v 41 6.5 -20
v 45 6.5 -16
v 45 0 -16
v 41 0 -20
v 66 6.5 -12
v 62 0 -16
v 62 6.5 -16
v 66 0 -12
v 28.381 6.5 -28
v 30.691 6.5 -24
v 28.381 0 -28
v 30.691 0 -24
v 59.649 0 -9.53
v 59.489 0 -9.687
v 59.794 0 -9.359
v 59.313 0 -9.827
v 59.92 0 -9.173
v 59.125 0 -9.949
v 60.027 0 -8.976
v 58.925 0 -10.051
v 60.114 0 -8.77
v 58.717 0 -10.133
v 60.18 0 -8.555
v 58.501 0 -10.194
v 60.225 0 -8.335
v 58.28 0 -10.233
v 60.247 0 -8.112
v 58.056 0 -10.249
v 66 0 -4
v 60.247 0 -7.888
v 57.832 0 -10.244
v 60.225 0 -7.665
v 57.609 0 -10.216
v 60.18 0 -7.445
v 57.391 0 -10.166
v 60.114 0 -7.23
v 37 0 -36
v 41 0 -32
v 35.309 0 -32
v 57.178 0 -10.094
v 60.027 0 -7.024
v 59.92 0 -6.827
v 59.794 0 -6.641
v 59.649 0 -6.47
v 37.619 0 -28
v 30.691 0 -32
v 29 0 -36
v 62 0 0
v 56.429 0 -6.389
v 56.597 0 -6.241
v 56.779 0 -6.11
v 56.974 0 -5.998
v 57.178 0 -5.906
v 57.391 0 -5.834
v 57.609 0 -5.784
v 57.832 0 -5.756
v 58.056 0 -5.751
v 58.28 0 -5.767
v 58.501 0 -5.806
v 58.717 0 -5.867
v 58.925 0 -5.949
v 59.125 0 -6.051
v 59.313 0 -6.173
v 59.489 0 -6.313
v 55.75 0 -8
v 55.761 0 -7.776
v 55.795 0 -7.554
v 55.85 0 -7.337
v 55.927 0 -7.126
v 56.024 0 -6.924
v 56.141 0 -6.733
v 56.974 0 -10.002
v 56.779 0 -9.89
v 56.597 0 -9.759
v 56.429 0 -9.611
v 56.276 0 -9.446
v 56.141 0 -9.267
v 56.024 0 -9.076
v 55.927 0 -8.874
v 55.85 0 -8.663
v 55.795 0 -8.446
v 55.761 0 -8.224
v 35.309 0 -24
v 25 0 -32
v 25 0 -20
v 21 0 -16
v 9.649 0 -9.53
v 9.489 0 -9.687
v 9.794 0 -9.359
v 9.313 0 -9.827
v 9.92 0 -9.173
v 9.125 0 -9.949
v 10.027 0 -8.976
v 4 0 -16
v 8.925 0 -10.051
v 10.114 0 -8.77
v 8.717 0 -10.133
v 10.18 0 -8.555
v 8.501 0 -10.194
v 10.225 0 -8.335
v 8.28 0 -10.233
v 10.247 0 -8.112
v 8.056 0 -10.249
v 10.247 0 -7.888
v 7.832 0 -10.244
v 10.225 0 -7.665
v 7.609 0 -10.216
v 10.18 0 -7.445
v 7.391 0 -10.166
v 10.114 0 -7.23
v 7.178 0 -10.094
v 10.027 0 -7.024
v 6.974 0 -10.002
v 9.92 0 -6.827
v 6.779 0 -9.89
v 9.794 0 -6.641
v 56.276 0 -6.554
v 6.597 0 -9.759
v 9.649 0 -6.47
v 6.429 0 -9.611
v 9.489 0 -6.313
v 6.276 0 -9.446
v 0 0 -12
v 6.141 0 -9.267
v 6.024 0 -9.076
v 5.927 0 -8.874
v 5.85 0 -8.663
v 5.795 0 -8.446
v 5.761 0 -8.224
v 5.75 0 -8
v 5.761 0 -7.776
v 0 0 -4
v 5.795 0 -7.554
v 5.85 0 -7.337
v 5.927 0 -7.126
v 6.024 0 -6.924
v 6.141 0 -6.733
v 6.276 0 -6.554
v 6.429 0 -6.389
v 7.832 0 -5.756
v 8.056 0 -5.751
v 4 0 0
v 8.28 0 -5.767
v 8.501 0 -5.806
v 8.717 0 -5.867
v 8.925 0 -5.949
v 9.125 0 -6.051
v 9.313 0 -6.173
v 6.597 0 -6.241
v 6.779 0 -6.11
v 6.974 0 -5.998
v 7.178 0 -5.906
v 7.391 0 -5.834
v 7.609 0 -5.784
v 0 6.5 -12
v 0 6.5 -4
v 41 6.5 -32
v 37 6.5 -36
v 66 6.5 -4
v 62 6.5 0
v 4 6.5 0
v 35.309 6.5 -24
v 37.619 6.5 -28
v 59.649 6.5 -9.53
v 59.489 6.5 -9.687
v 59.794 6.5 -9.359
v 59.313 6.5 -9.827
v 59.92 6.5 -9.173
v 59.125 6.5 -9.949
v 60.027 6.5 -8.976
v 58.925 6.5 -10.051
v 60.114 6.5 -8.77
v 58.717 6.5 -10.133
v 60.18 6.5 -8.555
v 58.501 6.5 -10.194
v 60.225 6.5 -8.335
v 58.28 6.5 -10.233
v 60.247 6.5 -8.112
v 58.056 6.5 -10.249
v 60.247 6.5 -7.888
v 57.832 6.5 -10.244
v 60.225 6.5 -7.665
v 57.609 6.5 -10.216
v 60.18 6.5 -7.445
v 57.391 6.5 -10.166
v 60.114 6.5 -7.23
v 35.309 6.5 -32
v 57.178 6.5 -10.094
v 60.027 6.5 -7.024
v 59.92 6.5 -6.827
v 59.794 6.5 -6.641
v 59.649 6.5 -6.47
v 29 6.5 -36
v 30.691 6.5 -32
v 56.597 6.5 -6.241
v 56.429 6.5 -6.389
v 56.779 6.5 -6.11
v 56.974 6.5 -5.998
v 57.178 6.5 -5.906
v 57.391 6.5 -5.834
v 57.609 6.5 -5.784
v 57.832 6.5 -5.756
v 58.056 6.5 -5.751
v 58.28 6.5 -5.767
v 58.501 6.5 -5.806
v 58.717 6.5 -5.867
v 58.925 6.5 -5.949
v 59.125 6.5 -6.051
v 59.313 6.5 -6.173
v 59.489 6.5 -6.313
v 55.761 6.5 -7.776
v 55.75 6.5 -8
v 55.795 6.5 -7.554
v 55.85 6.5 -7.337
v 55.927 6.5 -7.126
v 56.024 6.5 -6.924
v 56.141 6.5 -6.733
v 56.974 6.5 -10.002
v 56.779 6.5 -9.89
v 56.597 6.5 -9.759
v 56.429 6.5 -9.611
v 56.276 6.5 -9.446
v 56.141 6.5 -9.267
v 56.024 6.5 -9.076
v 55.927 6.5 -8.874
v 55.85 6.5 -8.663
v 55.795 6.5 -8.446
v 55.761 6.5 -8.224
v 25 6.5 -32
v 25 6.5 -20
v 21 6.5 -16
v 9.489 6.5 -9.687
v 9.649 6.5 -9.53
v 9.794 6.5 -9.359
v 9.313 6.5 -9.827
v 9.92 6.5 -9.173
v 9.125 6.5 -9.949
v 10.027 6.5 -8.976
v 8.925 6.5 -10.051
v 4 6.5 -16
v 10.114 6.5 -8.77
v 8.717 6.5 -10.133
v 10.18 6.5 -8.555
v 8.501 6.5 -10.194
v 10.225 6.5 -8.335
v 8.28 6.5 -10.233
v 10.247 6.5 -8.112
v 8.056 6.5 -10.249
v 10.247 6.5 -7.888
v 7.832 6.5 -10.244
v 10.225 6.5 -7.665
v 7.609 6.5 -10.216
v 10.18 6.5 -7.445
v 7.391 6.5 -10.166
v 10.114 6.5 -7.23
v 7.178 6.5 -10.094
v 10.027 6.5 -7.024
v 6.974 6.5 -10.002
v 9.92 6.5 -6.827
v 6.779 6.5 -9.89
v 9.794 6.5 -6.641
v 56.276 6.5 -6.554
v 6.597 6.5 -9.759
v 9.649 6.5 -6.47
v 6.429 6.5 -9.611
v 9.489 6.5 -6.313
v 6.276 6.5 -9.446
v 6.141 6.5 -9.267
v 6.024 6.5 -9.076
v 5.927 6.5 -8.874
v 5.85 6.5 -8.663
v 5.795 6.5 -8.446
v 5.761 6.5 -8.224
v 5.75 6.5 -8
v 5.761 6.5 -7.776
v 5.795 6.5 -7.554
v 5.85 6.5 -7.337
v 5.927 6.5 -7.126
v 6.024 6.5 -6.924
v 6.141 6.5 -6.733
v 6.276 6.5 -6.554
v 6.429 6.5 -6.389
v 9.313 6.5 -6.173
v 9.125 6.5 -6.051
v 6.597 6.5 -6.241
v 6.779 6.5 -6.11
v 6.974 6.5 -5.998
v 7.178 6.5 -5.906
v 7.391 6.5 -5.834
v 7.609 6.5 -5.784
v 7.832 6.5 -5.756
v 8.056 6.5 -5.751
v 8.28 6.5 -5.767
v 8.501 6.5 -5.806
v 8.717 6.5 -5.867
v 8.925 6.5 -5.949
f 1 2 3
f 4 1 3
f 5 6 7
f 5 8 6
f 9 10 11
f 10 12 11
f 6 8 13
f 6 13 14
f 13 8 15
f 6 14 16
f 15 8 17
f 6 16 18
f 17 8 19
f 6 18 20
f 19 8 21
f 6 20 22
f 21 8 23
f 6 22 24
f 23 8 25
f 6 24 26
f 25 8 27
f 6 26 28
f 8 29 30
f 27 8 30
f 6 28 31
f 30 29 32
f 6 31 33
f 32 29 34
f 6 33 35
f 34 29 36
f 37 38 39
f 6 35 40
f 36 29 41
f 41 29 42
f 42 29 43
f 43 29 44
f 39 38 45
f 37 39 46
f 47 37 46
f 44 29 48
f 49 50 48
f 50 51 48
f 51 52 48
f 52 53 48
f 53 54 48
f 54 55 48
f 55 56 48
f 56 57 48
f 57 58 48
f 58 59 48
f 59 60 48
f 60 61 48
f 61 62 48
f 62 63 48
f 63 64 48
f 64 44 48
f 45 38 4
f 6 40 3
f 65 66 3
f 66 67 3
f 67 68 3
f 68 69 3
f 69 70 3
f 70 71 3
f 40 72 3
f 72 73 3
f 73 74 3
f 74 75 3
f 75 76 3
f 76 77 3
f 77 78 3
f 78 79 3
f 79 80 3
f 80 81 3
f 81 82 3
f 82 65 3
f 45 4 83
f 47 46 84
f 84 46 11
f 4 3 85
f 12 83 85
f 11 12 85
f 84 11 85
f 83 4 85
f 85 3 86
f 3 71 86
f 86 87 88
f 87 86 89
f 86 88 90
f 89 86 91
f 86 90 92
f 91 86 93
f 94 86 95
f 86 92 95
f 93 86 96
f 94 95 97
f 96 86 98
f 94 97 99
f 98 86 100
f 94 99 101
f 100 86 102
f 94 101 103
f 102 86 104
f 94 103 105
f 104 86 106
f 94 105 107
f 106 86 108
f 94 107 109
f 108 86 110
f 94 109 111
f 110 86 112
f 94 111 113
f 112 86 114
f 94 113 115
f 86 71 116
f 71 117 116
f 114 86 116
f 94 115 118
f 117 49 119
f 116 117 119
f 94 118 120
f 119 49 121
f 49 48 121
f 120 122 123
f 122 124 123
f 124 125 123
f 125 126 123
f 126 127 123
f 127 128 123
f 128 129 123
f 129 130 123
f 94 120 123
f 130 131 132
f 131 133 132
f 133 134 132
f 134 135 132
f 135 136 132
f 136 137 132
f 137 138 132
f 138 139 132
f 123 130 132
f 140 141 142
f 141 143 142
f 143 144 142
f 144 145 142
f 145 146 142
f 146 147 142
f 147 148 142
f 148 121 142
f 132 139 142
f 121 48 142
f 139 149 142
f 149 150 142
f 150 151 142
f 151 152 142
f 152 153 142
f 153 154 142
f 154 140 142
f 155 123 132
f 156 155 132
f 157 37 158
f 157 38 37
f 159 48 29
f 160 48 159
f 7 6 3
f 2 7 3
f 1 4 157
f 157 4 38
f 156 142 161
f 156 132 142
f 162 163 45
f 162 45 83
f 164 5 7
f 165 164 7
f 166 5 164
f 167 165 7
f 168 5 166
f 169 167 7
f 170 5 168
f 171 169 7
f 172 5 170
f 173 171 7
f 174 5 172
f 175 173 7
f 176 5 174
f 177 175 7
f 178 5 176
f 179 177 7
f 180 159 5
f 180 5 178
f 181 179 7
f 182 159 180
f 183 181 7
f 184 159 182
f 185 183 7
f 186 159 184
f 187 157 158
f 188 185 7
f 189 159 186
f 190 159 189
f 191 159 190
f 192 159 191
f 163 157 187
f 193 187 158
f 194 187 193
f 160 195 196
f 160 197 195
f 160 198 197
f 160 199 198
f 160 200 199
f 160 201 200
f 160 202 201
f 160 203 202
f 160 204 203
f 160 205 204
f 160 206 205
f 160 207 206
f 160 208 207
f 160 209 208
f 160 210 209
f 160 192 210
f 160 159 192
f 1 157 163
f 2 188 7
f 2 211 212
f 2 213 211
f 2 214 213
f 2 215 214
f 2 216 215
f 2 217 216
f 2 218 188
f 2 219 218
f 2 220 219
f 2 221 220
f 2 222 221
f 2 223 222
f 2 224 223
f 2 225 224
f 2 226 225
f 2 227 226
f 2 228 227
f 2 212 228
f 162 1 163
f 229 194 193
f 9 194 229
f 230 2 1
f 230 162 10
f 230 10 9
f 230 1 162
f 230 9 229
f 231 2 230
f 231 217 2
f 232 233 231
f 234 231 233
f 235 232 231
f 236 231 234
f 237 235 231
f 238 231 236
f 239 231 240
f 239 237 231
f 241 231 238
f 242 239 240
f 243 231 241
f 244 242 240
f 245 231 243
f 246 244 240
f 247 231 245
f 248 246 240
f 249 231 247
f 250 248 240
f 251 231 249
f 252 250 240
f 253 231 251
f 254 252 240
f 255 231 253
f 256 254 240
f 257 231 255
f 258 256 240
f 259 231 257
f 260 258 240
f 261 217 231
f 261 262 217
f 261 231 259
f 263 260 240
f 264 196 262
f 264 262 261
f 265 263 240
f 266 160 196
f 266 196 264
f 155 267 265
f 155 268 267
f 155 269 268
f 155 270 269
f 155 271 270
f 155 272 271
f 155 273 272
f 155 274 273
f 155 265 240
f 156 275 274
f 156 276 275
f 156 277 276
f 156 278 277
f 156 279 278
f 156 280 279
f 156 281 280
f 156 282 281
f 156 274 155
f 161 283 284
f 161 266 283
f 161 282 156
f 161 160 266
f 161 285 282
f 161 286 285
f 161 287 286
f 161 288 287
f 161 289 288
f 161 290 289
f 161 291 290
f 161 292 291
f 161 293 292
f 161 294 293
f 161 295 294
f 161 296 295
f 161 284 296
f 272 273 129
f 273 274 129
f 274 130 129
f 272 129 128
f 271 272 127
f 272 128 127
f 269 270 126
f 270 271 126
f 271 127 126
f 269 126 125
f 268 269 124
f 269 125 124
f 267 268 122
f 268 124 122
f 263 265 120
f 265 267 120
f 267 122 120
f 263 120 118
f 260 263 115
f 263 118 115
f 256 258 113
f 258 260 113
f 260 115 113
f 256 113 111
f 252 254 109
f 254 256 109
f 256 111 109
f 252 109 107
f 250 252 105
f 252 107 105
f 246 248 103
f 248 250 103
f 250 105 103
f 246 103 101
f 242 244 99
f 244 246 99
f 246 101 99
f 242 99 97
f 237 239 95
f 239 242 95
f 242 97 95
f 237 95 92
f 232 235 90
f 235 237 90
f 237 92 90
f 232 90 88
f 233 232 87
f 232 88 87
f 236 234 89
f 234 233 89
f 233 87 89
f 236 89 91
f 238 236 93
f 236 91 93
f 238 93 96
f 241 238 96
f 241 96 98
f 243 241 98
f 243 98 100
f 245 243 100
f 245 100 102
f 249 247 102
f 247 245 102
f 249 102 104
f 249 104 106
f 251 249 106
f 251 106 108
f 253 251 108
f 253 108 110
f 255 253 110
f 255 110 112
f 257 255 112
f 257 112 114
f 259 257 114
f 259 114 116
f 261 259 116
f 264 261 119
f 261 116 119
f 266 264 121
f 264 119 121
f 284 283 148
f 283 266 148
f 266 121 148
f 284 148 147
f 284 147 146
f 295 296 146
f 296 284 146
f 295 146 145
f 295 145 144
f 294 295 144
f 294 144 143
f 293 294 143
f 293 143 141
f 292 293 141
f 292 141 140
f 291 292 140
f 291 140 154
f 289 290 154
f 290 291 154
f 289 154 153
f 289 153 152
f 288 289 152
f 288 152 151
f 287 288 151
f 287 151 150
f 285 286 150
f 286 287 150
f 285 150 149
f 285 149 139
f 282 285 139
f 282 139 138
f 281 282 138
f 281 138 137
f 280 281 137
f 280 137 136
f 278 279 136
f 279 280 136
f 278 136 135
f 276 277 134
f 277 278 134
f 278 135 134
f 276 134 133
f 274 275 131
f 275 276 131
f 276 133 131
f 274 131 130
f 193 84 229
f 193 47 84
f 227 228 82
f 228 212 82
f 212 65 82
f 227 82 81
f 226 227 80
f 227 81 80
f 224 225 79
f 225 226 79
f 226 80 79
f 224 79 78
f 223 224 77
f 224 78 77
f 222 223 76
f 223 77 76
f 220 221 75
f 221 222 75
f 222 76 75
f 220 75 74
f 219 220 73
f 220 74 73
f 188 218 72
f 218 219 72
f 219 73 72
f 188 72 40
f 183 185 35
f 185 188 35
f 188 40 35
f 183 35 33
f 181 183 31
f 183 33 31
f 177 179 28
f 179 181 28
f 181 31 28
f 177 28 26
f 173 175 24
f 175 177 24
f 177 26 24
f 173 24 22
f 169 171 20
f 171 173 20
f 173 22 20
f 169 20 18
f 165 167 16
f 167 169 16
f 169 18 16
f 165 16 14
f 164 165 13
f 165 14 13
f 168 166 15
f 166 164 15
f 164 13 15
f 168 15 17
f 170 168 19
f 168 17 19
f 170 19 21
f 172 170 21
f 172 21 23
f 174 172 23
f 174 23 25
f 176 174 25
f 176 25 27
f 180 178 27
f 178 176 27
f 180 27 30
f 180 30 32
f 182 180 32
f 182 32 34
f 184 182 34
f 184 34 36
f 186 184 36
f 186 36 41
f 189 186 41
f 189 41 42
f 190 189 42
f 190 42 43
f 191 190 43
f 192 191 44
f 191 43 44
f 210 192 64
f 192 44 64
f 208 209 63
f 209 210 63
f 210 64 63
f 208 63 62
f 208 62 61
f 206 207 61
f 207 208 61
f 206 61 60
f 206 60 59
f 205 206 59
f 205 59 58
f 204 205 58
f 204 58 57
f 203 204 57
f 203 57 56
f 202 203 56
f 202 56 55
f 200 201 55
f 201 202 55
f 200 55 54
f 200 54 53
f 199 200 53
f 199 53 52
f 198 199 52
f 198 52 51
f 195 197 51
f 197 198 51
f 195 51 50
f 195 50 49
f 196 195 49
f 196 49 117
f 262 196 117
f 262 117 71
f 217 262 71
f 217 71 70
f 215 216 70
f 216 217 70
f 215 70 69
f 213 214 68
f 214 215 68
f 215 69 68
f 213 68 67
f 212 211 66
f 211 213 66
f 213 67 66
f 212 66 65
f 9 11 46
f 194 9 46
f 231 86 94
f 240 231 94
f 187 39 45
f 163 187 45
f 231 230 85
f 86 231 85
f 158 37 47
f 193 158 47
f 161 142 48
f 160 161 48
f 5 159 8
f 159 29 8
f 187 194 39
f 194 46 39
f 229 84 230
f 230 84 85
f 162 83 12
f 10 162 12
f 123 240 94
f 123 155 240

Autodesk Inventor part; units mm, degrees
ref_plane "YZ Plane" through (0, 0, 0) normal (1, 0, 0) x (0, 1, 0)
ref_plane "XZ Plane" through (0, 0, 0) normal (0, 1, 0) x (-1, 0, 0)
ref_plane "XY Plane" through (0, 0, 0) normal (0, 0, 1) x (1, 0, 0)
sketch "Sketch1" plane through (0, 0, 0) normal (0, 1, 0) x (-1, 0, 0)
  line L0 (0, -16) -> (0, 0)
  line L1 (0, 0) -> (-66, 0)
  line L2 (-66, 0) -> (-66, -16)
  line L3 (-66, -16) -> (-41, -16)
  line L4 (-41, -16) -> (-41, -36)
  line L5 (-41, -36) -> (-25, -36)
  line L6 (-25, -36) -> (-25, -16)
  line L7 (-25, -16) -> (0, -16)
  circle A0 centre (-8, -8) radius 2.25
  circle A1 centre (-58, -8) radius 2.25
  line L8 (-35.3094, -24) -> (-30.6906, -24)
  line L9 (-30.6906, -24) -> (-28.3812, -28)
  line L10 (-28.3812, -28) -> (-30.6906, -32)
  line L11 (-30.6906, -32) -> (-35.3094, -32)
  line L12 (-35.3094, -32) -> (-37.6188, -28)
  line L13 (-37.6188, -28) -> (-35.3094, -24)
  point P0 (0, -8)
  point P1 (-33, -28)
  point P2 (-33, -36)
  dimension "d0" = 16
  dimension "d1" = 4.5
  dimension "d2" = 50
  dimension "d3" = 8
  dimension "d4" = 8
  dimension "d5" = 16
  dimension "d6" = 36
  dimension "d7" = 8
  dimension "d8" = 20
extrude "Extrusion1" add sketch "Sketch1" along normal blind 6.5
chamfer "Chamfer1" distance 4 angle 45 8 edges at (66, 3.25, 0) (66, 3.25, -16) (0, 3.25, 0) (0, 3.25, -16) (25, 3.25, -16) (25, 3.25, -36) (41, 3.25, -36) (41, 3.25, -16)
equation "\"d3\" = 0.5 * d0"
equation "\"d4\" = d3"
properties part number "y_carriage_nut_holder_b" material "Plywood, Finish"
